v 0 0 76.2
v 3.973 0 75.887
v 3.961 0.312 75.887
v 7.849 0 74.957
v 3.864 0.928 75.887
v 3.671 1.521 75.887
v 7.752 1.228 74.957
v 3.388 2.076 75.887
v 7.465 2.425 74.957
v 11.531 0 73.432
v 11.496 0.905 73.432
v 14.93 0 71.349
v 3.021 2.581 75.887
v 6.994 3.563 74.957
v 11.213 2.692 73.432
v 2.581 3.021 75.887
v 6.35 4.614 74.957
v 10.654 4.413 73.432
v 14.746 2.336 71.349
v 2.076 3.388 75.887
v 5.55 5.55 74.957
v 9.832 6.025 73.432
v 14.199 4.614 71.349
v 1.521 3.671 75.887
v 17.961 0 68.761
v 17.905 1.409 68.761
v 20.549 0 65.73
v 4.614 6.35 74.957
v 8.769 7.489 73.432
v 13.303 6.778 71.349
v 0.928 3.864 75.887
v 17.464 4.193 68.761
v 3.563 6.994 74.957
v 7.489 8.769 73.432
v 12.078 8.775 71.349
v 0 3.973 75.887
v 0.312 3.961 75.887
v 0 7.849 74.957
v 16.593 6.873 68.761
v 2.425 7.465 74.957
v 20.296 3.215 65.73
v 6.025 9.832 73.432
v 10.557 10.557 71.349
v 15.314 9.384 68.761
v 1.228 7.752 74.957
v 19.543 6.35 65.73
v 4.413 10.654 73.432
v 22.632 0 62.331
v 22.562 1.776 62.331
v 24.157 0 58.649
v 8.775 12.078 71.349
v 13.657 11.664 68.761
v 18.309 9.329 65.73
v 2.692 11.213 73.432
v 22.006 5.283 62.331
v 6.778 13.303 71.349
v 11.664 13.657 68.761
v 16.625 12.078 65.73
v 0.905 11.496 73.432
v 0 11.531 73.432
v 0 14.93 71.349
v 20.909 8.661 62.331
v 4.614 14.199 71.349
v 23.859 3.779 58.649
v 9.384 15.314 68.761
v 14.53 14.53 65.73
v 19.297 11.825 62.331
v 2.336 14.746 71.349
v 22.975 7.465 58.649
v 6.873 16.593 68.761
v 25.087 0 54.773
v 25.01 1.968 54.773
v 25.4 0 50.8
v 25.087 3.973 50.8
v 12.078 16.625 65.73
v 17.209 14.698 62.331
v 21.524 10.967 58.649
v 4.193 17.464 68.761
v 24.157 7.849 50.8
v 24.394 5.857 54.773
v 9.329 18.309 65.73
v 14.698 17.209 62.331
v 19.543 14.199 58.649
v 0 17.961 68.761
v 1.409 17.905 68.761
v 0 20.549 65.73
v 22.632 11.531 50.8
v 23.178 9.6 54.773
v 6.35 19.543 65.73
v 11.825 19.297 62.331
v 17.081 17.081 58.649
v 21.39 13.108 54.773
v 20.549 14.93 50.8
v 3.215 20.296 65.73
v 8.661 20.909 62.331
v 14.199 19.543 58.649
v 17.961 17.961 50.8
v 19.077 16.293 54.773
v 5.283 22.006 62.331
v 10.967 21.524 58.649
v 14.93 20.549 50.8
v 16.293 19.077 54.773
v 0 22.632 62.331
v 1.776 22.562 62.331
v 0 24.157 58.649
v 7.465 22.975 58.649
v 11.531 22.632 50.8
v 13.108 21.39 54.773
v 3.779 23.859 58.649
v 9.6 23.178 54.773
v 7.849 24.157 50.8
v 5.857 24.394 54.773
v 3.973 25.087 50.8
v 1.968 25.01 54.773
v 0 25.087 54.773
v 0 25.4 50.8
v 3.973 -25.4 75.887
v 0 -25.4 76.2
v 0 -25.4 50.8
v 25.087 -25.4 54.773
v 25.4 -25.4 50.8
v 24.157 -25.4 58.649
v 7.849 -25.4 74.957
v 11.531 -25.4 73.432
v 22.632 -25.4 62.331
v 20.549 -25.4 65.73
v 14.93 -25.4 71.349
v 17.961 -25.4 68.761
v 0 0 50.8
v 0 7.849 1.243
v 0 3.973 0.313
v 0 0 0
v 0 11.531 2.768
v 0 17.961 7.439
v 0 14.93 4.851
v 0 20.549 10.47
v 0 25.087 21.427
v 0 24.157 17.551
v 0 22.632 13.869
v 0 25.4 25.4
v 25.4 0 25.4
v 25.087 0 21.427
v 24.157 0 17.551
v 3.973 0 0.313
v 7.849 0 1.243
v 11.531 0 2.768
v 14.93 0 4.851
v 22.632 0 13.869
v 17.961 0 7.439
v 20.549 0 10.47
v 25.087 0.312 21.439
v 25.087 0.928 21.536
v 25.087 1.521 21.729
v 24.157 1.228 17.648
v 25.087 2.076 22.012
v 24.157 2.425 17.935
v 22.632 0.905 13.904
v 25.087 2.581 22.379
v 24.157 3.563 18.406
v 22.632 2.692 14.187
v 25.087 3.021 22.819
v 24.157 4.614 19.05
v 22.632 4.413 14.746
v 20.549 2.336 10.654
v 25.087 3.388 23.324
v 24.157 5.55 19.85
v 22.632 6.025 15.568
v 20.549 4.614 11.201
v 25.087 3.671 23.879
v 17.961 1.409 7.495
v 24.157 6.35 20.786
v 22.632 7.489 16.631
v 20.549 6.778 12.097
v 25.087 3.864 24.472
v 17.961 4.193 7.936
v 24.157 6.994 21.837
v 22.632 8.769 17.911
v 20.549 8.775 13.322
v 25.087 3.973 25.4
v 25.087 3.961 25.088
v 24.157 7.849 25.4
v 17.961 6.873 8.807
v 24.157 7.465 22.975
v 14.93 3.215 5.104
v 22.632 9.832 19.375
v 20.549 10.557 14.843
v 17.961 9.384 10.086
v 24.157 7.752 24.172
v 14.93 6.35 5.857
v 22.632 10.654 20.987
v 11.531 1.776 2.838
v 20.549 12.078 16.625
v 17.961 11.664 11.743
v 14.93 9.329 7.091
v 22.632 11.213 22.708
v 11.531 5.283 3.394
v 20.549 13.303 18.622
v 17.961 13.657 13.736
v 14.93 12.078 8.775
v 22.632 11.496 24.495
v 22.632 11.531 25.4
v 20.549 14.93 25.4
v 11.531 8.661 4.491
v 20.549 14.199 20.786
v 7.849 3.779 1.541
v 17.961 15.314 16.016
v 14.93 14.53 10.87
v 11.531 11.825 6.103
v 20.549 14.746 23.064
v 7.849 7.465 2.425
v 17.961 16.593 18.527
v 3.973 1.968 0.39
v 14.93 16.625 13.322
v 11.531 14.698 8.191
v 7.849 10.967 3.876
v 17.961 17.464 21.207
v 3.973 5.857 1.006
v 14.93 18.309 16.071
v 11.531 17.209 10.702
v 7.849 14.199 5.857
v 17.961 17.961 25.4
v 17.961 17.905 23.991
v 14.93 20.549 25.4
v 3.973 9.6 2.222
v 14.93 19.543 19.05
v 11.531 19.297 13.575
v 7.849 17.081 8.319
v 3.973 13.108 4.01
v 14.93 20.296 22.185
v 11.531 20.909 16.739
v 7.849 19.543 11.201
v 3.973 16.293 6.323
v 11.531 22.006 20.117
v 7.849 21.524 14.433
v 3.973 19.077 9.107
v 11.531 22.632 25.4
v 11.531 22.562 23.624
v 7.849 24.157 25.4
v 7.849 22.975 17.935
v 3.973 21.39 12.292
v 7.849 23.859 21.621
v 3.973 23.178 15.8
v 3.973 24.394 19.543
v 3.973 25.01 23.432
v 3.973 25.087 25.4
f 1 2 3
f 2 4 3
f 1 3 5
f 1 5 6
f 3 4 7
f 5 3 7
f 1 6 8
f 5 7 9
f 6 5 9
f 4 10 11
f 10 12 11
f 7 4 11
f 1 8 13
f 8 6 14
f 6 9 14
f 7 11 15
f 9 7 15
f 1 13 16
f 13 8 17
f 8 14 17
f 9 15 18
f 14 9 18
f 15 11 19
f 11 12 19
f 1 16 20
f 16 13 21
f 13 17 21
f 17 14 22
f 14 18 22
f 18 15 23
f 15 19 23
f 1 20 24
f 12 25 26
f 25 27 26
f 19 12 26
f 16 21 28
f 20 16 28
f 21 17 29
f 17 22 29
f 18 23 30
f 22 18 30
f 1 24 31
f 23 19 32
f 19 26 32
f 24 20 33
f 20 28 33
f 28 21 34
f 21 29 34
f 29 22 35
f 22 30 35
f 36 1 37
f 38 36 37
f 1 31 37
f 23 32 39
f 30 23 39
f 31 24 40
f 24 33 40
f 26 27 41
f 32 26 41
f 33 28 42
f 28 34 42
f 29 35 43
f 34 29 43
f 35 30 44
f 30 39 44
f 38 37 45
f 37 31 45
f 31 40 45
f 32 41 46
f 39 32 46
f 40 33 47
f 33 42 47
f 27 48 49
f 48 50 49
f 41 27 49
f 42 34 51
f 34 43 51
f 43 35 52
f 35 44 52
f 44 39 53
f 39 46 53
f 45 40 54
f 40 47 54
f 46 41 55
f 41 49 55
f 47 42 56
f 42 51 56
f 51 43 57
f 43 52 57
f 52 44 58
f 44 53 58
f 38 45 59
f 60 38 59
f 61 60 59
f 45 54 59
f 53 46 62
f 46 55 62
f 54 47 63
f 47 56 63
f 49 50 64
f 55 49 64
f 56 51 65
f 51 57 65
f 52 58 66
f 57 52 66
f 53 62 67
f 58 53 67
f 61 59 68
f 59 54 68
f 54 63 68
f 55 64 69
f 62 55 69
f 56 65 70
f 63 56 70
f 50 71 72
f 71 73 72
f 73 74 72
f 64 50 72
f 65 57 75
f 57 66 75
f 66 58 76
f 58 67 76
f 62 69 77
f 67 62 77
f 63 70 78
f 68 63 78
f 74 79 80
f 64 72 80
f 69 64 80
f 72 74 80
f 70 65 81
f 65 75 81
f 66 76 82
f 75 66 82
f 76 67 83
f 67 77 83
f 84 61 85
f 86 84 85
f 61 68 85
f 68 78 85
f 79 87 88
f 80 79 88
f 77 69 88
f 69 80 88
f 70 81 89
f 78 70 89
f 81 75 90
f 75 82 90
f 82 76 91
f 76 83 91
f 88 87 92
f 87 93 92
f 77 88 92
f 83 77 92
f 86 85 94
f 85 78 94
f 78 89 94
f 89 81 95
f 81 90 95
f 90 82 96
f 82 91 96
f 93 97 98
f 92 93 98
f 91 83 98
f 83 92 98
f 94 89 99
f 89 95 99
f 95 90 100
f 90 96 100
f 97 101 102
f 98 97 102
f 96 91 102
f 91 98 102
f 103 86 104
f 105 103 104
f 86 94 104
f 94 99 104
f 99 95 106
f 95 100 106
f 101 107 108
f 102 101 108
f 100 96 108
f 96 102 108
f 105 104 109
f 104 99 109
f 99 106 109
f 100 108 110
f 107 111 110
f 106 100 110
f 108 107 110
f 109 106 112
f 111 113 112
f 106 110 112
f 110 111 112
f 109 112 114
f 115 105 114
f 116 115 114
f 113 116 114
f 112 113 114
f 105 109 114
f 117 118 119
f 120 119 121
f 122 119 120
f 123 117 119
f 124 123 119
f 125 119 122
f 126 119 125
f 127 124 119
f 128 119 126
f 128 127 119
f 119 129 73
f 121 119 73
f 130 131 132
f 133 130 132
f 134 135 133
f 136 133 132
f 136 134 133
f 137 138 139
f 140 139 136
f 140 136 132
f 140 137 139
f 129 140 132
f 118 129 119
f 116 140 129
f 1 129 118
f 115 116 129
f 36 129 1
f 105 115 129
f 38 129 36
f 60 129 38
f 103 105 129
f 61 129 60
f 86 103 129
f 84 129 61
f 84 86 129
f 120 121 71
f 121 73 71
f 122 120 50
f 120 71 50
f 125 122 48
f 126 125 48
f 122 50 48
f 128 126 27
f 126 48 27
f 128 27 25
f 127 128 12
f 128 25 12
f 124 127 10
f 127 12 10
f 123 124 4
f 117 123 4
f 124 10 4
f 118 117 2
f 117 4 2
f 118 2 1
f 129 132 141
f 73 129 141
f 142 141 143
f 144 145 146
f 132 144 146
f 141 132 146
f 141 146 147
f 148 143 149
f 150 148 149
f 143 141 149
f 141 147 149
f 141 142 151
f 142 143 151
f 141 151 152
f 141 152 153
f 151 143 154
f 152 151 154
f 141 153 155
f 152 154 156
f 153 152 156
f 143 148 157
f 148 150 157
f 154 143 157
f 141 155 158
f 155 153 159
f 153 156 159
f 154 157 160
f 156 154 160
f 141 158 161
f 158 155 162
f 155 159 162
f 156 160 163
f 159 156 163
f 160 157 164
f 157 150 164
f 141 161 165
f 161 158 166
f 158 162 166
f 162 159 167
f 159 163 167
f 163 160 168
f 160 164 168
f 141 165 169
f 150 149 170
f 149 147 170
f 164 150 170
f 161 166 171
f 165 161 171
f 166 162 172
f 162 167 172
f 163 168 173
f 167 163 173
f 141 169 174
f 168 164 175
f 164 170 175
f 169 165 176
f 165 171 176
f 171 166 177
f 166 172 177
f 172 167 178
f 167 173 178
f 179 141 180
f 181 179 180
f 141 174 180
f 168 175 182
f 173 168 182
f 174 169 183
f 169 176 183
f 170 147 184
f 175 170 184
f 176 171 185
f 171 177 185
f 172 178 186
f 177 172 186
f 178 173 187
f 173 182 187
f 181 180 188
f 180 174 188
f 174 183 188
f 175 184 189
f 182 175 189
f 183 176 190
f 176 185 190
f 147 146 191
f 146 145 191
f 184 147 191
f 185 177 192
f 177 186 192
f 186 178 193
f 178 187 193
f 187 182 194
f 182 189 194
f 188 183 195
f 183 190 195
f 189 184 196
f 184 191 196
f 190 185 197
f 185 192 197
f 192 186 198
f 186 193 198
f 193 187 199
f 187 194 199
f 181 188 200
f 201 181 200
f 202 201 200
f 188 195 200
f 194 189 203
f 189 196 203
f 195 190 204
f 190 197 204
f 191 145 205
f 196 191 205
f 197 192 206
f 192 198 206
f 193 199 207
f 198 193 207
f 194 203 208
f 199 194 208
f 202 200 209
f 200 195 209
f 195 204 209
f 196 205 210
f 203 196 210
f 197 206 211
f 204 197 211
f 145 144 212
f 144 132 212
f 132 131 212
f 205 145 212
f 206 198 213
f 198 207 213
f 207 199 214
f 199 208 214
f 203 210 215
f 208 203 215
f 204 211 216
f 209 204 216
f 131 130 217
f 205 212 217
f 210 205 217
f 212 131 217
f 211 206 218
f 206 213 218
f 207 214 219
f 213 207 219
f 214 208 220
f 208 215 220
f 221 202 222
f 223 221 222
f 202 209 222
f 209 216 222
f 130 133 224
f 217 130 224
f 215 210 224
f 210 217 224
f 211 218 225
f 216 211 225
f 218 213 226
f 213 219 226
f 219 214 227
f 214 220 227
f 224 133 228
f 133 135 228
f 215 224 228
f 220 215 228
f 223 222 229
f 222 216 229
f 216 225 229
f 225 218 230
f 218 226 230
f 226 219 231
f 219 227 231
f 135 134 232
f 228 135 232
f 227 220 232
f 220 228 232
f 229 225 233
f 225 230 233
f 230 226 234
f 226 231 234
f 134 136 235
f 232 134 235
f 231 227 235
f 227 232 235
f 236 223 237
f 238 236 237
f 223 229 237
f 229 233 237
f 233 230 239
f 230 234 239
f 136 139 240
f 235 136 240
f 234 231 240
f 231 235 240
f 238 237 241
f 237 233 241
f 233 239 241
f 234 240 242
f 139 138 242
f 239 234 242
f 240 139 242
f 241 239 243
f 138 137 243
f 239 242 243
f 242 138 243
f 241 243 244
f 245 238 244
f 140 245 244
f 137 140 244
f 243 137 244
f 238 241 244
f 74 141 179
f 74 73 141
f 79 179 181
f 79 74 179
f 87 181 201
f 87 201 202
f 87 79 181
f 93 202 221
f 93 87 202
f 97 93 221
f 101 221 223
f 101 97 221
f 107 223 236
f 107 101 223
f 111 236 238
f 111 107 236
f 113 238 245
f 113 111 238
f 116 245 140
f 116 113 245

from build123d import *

# Parameters (mm, degrees)
F0_W     = 25.4
F0_H     = 25.4
F1_DEPTH = 76.2
F2_W     = 25.4
F2_H     = 25.4
F3_DEPTH = 25.4
F4_R     = 25.39999


# Not quite as in the source:
# - a fillet or chamfer is up to 0.001 mm smaller than in the source, because OpenCascade refuses the exact size


with BuildPart() as f1:
    # F0 (on Top) → F1 (new body)
    with BuildSketch(Plane.XY):
        with Locations((12.7, 12.7)):
            Rectangle(F0_W, F0_H)
    extrude(amount=F1_DEPTH)

    # F2 (on face) → F3 (join)
    with BuildSketch(Plane.XZ):
        with Locations((12.7, 63.5)):
            Rectangle(F2_W, F2_H)
    extrude(amount=F3_DEPTH)

    # F4 (radius 25.4 in the source; OpenCascade refuses exactly that, so slightly less here)
    f4_edges = [f1.edges().sort_by_distance(p)[0] for p in [
        (12.7, 25.4, 0),
        (25.4, 12.7, 0),
        (25.4, 25.4, 38.1),
        (25.4, 0, 76.2),
        (12.7, 25.4, 76.2),
    ]]
    fillet(f4_edges, radius=F4_R)


solid = f1.part
